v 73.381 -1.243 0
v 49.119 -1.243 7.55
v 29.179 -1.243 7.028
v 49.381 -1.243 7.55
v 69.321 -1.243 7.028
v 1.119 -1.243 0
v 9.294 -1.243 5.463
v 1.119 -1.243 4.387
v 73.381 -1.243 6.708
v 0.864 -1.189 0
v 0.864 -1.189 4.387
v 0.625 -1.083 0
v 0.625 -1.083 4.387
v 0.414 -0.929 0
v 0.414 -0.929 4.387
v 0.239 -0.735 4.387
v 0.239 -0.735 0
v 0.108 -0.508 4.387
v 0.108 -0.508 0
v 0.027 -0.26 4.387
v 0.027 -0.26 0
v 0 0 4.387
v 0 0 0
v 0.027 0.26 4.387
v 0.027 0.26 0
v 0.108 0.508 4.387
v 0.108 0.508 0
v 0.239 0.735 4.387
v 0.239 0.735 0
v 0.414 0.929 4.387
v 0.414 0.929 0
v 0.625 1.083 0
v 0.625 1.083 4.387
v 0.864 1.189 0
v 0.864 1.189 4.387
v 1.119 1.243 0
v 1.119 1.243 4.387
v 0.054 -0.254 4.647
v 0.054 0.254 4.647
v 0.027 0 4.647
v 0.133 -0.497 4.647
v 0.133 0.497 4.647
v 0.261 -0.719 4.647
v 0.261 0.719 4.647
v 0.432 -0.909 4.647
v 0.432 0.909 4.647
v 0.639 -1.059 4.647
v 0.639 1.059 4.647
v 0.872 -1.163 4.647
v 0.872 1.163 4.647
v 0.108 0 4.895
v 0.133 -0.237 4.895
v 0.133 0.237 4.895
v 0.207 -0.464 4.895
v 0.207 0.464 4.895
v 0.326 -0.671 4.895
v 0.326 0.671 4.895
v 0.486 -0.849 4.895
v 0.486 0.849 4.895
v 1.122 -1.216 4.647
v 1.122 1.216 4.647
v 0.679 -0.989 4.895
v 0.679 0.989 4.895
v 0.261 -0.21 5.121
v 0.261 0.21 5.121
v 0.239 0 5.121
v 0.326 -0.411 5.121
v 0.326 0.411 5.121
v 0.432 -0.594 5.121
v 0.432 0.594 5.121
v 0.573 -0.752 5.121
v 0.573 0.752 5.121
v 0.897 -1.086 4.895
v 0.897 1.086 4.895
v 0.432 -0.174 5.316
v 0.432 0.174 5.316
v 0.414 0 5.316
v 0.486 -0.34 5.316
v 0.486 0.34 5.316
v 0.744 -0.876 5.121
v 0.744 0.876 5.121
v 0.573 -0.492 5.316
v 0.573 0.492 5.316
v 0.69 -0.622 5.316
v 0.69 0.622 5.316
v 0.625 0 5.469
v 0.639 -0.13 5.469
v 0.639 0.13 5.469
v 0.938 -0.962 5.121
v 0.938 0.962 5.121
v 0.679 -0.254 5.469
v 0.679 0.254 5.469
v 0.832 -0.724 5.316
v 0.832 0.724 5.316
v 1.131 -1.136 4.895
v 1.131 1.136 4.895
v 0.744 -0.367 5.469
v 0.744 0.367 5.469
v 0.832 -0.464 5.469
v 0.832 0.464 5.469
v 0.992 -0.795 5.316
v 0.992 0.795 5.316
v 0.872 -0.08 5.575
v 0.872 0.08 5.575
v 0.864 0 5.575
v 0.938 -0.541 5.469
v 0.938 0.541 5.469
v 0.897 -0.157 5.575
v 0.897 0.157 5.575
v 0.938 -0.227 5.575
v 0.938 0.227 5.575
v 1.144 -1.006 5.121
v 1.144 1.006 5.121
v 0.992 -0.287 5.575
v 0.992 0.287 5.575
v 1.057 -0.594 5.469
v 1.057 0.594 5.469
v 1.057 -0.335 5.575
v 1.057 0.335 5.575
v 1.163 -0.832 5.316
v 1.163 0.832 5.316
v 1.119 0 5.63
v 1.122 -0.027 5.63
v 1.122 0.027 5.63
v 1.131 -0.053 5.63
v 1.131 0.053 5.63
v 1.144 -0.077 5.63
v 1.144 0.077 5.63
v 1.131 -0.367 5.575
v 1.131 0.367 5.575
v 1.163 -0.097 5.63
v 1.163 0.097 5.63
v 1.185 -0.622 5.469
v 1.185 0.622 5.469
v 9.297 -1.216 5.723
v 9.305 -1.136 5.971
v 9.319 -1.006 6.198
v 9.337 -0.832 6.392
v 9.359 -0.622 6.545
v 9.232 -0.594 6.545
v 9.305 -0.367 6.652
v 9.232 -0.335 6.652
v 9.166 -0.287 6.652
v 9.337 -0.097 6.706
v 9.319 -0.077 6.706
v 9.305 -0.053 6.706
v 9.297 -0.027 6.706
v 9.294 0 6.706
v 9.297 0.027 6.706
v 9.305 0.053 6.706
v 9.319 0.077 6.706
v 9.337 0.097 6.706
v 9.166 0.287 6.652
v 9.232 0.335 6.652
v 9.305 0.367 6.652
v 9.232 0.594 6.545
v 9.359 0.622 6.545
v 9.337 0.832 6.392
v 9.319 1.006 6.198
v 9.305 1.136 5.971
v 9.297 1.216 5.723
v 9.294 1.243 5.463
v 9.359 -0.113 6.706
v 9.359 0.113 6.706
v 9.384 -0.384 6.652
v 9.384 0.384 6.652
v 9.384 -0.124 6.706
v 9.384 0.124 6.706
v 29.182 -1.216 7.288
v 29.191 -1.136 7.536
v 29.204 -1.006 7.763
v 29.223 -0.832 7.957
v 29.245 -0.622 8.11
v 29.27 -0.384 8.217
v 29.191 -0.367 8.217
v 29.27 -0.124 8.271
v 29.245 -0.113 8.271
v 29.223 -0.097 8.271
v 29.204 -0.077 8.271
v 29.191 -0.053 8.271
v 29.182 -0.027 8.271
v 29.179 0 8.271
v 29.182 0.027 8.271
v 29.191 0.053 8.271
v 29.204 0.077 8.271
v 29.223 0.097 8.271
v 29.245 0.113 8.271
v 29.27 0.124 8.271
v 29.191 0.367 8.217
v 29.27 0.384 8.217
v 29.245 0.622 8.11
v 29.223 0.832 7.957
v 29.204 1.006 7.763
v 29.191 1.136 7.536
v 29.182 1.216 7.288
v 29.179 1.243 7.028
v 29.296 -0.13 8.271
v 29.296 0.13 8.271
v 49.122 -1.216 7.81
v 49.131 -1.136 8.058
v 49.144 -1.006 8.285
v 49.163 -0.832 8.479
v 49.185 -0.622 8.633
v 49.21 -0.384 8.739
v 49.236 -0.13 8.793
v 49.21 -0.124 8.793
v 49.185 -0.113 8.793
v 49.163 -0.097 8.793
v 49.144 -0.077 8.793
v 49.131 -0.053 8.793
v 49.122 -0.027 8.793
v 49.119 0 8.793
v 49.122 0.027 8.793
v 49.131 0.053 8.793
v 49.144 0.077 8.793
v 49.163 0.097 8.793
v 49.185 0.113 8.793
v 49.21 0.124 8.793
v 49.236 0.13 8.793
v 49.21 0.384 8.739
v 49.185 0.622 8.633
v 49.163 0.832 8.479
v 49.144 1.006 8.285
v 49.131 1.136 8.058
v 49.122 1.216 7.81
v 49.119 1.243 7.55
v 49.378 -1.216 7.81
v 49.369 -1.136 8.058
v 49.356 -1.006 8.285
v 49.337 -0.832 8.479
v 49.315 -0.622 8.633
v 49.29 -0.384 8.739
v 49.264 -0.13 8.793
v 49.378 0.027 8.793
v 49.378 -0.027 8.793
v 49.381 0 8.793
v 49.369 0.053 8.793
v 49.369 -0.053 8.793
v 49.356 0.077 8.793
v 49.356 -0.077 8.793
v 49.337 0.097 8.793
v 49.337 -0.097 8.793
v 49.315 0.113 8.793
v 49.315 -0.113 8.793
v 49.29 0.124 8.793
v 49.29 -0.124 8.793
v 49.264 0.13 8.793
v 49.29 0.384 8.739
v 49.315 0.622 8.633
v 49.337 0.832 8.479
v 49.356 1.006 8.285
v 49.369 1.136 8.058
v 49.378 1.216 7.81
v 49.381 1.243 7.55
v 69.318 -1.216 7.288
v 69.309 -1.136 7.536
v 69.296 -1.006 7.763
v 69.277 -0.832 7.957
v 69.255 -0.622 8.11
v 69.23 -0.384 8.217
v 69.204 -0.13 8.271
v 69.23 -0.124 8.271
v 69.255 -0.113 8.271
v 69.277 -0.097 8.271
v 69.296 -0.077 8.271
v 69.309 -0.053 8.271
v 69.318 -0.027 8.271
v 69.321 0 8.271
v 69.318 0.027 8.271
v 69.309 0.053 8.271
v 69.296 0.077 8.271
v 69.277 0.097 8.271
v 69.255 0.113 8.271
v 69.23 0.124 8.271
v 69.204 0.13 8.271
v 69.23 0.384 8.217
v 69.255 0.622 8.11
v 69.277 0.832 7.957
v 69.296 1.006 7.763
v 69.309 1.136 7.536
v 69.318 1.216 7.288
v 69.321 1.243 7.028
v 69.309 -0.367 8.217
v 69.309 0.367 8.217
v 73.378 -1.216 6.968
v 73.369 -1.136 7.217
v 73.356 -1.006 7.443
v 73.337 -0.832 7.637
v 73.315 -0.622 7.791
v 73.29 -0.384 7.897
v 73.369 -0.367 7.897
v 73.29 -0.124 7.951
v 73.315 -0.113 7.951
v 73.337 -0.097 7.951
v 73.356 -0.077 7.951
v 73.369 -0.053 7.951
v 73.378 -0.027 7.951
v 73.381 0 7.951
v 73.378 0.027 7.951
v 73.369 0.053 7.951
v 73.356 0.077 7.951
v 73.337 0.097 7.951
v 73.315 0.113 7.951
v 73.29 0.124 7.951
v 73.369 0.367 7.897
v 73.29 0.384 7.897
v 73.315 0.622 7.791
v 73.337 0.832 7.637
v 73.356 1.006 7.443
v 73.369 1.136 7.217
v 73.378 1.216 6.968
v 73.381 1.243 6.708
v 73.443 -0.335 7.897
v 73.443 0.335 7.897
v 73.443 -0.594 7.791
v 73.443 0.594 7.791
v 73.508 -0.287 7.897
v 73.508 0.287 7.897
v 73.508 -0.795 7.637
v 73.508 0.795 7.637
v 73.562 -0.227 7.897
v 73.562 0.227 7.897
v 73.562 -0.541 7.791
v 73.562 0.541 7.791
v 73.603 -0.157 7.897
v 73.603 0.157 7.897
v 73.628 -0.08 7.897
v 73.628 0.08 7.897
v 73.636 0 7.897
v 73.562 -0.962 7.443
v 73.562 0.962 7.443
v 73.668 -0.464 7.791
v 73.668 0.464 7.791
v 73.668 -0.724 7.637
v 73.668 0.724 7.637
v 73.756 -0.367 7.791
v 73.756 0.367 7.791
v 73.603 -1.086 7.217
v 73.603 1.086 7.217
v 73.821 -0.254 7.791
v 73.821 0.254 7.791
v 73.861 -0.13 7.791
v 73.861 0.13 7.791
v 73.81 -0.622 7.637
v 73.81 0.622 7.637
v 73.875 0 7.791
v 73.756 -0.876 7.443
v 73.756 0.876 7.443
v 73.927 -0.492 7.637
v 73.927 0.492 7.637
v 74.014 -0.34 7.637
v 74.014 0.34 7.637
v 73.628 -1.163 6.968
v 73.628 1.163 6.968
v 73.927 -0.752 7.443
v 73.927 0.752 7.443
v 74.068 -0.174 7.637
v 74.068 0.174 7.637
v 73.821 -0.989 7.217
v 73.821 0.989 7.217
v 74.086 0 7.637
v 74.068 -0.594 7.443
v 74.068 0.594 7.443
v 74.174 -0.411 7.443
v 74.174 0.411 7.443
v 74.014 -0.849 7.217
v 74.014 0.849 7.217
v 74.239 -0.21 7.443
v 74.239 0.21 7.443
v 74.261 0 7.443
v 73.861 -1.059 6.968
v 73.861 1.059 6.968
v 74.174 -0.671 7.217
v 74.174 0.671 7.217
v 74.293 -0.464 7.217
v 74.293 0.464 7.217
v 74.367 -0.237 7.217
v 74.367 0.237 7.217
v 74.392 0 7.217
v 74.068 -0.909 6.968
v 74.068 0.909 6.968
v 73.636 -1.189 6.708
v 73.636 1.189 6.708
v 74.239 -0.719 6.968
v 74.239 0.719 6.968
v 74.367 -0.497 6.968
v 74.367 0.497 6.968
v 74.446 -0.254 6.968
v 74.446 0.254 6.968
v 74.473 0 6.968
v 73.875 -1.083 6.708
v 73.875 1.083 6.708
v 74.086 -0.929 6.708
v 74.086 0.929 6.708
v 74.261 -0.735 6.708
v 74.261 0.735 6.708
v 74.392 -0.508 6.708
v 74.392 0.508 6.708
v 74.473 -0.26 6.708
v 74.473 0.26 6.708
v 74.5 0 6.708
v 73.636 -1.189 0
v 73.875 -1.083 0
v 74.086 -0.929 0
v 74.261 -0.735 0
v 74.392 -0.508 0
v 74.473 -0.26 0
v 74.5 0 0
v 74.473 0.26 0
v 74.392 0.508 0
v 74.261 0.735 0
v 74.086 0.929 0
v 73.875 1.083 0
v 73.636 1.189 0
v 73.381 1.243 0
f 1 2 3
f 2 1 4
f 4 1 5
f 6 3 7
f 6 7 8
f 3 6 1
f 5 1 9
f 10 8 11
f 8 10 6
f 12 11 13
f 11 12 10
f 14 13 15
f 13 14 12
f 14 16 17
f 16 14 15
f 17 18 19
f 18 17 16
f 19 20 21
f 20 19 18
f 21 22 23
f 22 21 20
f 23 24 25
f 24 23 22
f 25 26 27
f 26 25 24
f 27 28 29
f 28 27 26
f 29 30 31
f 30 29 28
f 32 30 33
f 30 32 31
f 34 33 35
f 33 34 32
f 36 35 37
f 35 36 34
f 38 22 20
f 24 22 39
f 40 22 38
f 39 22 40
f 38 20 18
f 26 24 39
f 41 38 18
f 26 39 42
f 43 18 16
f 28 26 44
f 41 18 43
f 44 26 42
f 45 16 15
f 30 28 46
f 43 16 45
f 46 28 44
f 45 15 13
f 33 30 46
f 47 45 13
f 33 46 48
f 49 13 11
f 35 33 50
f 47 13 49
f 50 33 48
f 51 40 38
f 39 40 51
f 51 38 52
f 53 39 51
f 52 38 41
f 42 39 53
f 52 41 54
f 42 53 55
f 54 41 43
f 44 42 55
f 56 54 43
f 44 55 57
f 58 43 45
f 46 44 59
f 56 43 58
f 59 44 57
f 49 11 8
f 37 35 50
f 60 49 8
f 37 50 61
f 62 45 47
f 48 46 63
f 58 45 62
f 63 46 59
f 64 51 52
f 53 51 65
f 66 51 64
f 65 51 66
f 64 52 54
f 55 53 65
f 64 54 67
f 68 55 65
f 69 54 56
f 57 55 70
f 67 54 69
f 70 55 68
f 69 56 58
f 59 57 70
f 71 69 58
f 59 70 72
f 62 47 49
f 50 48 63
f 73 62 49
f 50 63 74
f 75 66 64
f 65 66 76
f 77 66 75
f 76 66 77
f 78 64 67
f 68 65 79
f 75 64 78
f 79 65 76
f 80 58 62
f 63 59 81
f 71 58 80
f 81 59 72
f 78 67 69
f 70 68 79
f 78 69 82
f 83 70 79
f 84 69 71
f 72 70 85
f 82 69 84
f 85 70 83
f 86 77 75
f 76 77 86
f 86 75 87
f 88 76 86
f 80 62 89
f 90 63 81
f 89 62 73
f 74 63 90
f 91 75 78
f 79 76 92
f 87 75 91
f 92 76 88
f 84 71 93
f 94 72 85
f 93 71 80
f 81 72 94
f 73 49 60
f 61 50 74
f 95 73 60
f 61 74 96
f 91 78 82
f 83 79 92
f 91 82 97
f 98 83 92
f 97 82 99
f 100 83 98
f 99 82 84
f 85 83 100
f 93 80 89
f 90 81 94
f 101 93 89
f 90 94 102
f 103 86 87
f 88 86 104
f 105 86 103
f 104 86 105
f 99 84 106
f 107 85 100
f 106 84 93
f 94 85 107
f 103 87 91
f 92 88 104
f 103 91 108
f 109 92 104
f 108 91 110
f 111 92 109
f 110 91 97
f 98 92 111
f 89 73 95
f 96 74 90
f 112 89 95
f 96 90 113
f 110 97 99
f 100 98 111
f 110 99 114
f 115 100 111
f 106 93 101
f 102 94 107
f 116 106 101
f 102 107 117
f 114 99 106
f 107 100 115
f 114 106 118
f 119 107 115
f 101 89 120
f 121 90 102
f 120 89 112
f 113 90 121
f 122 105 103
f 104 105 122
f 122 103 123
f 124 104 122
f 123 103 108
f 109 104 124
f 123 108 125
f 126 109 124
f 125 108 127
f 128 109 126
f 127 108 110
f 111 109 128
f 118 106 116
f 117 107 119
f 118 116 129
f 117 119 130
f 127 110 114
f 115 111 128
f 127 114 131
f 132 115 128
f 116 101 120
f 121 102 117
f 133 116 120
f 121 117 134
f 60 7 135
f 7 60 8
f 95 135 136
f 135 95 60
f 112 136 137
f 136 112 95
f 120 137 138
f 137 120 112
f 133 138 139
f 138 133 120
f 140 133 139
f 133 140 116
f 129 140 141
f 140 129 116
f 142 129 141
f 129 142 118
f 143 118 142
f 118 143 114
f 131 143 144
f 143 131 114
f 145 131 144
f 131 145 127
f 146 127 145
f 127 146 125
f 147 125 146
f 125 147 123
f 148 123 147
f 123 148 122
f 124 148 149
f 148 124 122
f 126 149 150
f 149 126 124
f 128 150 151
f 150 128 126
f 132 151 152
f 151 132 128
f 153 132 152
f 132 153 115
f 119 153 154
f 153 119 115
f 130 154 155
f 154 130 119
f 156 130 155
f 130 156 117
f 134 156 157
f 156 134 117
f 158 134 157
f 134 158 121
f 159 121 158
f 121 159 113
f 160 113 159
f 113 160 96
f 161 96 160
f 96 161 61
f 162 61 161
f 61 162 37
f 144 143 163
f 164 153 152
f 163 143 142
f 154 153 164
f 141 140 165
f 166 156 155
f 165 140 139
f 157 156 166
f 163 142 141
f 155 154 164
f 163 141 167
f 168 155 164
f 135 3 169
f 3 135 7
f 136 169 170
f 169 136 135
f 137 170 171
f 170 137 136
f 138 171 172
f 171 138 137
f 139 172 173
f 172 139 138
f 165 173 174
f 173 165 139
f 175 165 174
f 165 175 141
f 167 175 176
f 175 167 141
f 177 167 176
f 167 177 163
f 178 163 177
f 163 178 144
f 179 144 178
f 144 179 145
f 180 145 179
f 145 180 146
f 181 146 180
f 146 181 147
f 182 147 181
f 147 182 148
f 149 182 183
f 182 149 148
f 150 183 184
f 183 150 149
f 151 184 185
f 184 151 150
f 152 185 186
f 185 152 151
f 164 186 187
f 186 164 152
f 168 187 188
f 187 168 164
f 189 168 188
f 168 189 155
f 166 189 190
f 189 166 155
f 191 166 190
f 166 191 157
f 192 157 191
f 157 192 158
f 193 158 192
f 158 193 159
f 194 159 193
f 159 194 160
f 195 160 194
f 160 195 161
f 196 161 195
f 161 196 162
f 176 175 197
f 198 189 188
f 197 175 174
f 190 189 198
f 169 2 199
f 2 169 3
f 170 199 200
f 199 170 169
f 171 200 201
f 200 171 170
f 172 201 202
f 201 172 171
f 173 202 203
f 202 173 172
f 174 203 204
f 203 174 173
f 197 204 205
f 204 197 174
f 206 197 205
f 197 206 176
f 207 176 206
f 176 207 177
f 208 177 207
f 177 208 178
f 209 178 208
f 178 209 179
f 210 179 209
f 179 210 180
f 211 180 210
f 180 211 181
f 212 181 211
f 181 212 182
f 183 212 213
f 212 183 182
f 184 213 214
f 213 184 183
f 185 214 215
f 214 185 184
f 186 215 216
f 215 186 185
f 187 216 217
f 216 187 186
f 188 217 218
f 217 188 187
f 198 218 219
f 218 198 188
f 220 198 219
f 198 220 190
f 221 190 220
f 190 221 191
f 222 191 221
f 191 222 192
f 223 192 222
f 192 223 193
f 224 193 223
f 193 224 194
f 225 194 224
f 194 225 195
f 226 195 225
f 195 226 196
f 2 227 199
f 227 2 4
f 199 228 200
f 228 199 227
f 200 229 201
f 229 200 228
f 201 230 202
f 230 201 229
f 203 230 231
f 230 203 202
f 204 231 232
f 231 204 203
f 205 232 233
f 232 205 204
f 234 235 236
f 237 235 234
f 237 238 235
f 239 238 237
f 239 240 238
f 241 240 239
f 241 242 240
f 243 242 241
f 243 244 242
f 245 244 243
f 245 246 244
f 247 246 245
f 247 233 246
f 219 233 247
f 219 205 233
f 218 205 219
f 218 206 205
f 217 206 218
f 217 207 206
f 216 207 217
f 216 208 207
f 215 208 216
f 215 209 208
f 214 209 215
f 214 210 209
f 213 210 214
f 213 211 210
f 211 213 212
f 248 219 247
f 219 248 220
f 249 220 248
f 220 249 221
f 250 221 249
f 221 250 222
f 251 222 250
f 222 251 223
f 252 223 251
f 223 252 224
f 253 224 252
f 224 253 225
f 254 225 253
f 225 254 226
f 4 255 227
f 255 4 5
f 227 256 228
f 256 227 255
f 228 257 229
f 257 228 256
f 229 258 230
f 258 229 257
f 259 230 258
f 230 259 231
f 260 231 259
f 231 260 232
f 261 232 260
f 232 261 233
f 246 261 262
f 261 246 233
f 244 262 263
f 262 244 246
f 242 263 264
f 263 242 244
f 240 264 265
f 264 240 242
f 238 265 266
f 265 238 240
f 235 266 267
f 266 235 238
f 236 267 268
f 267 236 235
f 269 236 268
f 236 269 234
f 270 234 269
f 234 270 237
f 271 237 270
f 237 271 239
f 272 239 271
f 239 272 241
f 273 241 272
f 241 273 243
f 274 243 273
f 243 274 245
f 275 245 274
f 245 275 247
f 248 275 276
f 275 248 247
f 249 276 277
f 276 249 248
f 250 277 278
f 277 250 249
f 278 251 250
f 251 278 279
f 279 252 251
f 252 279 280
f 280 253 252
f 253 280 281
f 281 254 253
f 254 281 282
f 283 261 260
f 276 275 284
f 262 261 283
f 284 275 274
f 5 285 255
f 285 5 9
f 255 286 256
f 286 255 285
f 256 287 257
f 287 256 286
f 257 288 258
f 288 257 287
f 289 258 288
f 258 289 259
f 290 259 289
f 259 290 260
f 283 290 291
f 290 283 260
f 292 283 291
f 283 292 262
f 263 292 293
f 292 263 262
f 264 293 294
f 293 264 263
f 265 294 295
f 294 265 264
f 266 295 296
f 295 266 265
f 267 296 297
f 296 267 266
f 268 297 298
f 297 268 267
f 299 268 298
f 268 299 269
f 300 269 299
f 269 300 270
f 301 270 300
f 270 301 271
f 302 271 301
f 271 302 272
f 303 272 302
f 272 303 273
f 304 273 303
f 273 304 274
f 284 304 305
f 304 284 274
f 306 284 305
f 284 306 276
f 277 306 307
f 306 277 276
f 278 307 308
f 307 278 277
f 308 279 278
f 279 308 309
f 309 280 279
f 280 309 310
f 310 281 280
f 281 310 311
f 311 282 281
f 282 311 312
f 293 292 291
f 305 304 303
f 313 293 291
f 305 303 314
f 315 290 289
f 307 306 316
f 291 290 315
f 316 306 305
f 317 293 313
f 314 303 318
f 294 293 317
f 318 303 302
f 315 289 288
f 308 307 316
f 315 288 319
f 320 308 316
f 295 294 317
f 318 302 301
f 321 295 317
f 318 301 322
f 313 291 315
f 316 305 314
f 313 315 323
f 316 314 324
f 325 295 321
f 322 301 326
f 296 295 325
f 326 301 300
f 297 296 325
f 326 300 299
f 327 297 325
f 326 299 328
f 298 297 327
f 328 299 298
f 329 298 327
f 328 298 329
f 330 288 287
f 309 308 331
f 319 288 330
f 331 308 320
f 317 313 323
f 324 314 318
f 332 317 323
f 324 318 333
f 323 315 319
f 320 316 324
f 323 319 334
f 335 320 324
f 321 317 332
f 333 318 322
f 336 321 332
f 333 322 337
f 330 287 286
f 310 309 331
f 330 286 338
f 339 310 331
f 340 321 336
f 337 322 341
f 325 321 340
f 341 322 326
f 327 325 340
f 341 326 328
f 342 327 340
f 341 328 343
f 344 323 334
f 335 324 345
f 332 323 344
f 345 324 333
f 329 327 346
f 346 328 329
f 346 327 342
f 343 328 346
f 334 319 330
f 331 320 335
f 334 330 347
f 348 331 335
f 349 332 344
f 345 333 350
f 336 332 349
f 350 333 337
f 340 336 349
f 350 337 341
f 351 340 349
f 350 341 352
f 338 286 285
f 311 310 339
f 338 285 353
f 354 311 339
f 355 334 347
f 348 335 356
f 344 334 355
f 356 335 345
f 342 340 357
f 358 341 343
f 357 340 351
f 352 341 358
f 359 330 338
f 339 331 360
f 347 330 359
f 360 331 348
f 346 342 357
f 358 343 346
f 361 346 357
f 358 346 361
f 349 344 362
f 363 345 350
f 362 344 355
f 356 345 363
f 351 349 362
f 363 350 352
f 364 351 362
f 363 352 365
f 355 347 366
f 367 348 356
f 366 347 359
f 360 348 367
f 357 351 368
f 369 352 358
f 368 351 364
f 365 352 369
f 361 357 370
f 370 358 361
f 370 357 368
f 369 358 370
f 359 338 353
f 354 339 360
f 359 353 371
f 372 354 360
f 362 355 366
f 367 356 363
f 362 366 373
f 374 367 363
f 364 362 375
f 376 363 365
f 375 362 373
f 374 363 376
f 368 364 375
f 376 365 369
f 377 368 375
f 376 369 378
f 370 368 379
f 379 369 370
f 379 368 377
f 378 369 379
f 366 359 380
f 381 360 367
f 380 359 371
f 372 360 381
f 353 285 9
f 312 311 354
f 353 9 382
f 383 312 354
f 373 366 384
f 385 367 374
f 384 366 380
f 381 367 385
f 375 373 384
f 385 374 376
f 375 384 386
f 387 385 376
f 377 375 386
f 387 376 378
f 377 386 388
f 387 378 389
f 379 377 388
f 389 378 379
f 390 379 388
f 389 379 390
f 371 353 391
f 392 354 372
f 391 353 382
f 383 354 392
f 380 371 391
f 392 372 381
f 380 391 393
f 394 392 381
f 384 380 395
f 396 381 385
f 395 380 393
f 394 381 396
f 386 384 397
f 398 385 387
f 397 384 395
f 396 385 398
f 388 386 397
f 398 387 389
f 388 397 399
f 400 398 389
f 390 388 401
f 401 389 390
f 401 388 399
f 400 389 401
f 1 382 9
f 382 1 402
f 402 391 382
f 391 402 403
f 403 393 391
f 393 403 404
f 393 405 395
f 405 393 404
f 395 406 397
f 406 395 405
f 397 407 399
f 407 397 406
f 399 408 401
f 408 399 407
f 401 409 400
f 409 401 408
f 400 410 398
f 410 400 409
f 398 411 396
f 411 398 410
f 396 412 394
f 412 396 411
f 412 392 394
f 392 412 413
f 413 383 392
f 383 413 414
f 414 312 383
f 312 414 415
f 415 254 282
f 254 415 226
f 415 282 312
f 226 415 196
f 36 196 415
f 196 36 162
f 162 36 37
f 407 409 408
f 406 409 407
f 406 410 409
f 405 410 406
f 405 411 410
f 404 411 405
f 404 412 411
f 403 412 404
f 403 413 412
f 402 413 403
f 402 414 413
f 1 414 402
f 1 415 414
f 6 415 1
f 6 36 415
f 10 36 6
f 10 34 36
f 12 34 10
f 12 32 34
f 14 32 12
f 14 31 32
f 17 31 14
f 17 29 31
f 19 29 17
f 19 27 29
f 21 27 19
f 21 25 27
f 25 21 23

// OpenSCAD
length = 75; // [120]
height = 8.8; // [1:0.1:14]
depth = 3; // [0.1:0.1:5]
fingerboard_radius = 381; // [184.15:7-1/4", 241.3:9-1/2", 254:10", 304.8:12", 355.6:14", 381:15", 406.4:16", 431.8:17", 508:20"]
center_offset = 0.64; // [0.5:0.01:0.67]

/* [Hidden] */
radius = depth/2 - 0.25;

difference() {
  minkowski() {
    translate([radius, 0, 0])
      intersection () {
        cube([length-depth, 0.01, height-radius]);
        translate([center_offset * length, 0, -fingerboard_radius+height-radius])
        rotate([90, 0, 0])
        cylinder(h = depth * 2, r = fingerboard_radius, $fn = 120);
      }
      sphere(radius, $fn = 30);
  }
  translate([0, -radius, -depth])
  cube([length, depth, depth]);
}
